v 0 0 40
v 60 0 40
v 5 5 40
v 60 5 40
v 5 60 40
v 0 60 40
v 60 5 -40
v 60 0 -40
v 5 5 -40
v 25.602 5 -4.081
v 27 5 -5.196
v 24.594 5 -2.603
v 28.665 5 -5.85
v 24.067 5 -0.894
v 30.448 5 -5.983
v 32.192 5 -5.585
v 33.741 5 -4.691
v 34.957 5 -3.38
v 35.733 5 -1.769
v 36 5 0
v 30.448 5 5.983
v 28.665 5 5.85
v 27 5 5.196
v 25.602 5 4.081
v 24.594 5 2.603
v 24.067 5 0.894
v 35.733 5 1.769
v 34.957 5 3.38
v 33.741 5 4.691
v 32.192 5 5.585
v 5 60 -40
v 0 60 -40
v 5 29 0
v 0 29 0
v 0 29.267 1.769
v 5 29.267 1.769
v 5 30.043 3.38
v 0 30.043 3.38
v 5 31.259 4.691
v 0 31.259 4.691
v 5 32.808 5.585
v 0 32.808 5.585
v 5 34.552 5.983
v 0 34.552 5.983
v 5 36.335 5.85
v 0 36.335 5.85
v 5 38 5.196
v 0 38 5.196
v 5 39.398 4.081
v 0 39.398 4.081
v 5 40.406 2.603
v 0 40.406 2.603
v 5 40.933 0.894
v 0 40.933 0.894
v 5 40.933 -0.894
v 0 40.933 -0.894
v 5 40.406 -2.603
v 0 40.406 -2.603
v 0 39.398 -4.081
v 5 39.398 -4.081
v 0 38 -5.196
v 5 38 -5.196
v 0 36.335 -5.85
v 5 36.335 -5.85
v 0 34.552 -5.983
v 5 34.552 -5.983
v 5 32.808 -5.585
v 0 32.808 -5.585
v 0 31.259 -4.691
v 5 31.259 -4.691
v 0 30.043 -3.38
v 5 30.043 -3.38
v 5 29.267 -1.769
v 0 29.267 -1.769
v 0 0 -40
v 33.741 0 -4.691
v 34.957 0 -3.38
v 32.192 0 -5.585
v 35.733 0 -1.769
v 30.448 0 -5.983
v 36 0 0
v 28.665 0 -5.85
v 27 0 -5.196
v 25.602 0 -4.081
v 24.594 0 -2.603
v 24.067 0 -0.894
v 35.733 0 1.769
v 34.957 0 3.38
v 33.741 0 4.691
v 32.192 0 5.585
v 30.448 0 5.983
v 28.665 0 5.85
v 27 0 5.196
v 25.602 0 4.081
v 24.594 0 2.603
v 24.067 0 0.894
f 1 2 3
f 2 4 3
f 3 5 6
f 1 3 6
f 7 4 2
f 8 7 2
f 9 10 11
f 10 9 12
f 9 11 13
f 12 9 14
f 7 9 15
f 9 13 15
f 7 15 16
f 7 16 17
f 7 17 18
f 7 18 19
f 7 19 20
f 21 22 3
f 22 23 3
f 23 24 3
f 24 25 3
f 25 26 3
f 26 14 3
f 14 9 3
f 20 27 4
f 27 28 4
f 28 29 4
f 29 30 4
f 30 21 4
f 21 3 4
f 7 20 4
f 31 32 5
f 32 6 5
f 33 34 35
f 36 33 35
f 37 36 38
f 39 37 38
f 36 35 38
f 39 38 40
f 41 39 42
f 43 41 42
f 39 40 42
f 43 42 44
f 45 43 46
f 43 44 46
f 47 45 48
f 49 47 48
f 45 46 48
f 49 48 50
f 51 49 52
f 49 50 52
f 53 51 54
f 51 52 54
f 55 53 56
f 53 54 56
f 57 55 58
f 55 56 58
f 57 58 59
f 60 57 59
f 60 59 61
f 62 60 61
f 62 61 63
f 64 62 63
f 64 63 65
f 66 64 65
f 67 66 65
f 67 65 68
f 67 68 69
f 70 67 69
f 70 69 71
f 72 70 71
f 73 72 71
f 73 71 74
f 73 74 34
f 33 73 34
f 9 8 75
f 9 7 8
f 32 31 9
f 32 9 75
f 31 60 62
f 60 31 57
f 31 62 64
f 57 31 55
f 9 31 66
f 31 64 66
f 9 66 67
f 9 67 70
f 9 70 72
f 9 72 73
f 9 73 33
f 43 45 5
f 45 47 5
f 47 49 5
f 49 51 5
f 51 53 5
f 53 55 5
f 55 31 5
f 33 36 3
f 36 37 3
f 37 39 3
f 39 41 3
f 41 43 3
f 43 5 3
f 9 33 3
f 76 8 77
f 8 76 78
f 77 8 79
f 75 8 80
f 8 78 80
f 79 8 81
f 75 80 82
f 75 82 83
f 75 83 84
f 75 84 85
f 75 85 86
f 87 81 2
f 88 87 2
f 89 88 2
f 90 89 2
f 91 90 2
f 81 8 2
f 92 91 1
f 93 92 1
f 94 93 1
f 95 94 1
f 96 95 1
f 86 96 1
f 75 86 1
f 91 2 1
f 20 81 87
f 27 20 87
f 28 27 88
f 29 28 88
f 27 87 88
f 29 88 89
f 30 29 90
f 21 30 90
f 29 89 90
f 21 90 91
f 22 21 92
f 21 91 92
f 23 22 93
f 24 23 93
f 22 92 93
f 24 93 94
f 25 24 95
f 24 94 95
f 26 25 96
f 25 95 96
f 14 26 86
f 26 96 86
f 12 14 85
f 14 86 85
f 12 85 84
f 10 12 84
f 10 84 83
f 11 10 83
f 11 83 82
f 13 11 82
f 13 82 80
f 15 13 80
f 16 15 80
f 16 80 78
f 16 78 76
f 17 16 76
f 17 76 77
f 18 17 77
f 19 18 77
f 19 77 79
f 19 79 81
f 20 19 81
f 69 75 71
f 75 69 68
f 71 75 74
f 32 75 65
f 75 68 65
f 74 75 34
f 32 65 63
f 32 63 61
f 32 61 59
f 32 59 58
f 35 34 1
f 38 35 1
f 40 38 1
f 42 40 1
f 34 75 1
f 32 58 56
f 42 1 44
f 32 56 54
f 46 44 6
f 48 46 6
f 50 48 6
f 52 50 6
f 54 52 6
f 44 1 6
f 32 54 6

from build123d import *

# Parameters (mm, degrees)
EXTRUDE_THIN1_DEPTH = 40
SKETCH2_R           = 6
CUT_EXTRUDE1_DEPTH  = 61
SKETCH3_R           = 6
CUT_EXTRUDE2_DEPTH  = 61


with BuildPart() as part:
    # Sketch1 → Extrude-Thin1 (new body, symmetric)
    with BuildSketch(Plane.XY):
        Polygon((60, 0), (0, 0), (0, 60), (5, 60), (5, 5), (60, 5), align=None)
    extrude(amount=EXTRUDE_THIN1_DEPTH, both=True)

    # Sketch2 → Cut-Extrude1 (cut, through all)
    with BuildSketch(Plane.XZ):
        with Locations((30, 0)):
            Circle(SKETCH2_R)
    extrude(amount=-CUT_EXTRUDE1_DEPTH, mode=Mode.SUBTRACT)

    # Sketch3 → Cut-Extrude2 (cut, through all)
    with BuildSketch(Plane(origin=(0, 0, 0), x_dir=(0, -1, 0), z_dir=(-1, 0, 0))):
        with Locations((-35, 0)):
            Circle(SKETCH3_R)
    extrude(amount=-CUT_EXTRUDE2_DEPTH, mode=Mode.SUBTRACT)


solid = part.part
